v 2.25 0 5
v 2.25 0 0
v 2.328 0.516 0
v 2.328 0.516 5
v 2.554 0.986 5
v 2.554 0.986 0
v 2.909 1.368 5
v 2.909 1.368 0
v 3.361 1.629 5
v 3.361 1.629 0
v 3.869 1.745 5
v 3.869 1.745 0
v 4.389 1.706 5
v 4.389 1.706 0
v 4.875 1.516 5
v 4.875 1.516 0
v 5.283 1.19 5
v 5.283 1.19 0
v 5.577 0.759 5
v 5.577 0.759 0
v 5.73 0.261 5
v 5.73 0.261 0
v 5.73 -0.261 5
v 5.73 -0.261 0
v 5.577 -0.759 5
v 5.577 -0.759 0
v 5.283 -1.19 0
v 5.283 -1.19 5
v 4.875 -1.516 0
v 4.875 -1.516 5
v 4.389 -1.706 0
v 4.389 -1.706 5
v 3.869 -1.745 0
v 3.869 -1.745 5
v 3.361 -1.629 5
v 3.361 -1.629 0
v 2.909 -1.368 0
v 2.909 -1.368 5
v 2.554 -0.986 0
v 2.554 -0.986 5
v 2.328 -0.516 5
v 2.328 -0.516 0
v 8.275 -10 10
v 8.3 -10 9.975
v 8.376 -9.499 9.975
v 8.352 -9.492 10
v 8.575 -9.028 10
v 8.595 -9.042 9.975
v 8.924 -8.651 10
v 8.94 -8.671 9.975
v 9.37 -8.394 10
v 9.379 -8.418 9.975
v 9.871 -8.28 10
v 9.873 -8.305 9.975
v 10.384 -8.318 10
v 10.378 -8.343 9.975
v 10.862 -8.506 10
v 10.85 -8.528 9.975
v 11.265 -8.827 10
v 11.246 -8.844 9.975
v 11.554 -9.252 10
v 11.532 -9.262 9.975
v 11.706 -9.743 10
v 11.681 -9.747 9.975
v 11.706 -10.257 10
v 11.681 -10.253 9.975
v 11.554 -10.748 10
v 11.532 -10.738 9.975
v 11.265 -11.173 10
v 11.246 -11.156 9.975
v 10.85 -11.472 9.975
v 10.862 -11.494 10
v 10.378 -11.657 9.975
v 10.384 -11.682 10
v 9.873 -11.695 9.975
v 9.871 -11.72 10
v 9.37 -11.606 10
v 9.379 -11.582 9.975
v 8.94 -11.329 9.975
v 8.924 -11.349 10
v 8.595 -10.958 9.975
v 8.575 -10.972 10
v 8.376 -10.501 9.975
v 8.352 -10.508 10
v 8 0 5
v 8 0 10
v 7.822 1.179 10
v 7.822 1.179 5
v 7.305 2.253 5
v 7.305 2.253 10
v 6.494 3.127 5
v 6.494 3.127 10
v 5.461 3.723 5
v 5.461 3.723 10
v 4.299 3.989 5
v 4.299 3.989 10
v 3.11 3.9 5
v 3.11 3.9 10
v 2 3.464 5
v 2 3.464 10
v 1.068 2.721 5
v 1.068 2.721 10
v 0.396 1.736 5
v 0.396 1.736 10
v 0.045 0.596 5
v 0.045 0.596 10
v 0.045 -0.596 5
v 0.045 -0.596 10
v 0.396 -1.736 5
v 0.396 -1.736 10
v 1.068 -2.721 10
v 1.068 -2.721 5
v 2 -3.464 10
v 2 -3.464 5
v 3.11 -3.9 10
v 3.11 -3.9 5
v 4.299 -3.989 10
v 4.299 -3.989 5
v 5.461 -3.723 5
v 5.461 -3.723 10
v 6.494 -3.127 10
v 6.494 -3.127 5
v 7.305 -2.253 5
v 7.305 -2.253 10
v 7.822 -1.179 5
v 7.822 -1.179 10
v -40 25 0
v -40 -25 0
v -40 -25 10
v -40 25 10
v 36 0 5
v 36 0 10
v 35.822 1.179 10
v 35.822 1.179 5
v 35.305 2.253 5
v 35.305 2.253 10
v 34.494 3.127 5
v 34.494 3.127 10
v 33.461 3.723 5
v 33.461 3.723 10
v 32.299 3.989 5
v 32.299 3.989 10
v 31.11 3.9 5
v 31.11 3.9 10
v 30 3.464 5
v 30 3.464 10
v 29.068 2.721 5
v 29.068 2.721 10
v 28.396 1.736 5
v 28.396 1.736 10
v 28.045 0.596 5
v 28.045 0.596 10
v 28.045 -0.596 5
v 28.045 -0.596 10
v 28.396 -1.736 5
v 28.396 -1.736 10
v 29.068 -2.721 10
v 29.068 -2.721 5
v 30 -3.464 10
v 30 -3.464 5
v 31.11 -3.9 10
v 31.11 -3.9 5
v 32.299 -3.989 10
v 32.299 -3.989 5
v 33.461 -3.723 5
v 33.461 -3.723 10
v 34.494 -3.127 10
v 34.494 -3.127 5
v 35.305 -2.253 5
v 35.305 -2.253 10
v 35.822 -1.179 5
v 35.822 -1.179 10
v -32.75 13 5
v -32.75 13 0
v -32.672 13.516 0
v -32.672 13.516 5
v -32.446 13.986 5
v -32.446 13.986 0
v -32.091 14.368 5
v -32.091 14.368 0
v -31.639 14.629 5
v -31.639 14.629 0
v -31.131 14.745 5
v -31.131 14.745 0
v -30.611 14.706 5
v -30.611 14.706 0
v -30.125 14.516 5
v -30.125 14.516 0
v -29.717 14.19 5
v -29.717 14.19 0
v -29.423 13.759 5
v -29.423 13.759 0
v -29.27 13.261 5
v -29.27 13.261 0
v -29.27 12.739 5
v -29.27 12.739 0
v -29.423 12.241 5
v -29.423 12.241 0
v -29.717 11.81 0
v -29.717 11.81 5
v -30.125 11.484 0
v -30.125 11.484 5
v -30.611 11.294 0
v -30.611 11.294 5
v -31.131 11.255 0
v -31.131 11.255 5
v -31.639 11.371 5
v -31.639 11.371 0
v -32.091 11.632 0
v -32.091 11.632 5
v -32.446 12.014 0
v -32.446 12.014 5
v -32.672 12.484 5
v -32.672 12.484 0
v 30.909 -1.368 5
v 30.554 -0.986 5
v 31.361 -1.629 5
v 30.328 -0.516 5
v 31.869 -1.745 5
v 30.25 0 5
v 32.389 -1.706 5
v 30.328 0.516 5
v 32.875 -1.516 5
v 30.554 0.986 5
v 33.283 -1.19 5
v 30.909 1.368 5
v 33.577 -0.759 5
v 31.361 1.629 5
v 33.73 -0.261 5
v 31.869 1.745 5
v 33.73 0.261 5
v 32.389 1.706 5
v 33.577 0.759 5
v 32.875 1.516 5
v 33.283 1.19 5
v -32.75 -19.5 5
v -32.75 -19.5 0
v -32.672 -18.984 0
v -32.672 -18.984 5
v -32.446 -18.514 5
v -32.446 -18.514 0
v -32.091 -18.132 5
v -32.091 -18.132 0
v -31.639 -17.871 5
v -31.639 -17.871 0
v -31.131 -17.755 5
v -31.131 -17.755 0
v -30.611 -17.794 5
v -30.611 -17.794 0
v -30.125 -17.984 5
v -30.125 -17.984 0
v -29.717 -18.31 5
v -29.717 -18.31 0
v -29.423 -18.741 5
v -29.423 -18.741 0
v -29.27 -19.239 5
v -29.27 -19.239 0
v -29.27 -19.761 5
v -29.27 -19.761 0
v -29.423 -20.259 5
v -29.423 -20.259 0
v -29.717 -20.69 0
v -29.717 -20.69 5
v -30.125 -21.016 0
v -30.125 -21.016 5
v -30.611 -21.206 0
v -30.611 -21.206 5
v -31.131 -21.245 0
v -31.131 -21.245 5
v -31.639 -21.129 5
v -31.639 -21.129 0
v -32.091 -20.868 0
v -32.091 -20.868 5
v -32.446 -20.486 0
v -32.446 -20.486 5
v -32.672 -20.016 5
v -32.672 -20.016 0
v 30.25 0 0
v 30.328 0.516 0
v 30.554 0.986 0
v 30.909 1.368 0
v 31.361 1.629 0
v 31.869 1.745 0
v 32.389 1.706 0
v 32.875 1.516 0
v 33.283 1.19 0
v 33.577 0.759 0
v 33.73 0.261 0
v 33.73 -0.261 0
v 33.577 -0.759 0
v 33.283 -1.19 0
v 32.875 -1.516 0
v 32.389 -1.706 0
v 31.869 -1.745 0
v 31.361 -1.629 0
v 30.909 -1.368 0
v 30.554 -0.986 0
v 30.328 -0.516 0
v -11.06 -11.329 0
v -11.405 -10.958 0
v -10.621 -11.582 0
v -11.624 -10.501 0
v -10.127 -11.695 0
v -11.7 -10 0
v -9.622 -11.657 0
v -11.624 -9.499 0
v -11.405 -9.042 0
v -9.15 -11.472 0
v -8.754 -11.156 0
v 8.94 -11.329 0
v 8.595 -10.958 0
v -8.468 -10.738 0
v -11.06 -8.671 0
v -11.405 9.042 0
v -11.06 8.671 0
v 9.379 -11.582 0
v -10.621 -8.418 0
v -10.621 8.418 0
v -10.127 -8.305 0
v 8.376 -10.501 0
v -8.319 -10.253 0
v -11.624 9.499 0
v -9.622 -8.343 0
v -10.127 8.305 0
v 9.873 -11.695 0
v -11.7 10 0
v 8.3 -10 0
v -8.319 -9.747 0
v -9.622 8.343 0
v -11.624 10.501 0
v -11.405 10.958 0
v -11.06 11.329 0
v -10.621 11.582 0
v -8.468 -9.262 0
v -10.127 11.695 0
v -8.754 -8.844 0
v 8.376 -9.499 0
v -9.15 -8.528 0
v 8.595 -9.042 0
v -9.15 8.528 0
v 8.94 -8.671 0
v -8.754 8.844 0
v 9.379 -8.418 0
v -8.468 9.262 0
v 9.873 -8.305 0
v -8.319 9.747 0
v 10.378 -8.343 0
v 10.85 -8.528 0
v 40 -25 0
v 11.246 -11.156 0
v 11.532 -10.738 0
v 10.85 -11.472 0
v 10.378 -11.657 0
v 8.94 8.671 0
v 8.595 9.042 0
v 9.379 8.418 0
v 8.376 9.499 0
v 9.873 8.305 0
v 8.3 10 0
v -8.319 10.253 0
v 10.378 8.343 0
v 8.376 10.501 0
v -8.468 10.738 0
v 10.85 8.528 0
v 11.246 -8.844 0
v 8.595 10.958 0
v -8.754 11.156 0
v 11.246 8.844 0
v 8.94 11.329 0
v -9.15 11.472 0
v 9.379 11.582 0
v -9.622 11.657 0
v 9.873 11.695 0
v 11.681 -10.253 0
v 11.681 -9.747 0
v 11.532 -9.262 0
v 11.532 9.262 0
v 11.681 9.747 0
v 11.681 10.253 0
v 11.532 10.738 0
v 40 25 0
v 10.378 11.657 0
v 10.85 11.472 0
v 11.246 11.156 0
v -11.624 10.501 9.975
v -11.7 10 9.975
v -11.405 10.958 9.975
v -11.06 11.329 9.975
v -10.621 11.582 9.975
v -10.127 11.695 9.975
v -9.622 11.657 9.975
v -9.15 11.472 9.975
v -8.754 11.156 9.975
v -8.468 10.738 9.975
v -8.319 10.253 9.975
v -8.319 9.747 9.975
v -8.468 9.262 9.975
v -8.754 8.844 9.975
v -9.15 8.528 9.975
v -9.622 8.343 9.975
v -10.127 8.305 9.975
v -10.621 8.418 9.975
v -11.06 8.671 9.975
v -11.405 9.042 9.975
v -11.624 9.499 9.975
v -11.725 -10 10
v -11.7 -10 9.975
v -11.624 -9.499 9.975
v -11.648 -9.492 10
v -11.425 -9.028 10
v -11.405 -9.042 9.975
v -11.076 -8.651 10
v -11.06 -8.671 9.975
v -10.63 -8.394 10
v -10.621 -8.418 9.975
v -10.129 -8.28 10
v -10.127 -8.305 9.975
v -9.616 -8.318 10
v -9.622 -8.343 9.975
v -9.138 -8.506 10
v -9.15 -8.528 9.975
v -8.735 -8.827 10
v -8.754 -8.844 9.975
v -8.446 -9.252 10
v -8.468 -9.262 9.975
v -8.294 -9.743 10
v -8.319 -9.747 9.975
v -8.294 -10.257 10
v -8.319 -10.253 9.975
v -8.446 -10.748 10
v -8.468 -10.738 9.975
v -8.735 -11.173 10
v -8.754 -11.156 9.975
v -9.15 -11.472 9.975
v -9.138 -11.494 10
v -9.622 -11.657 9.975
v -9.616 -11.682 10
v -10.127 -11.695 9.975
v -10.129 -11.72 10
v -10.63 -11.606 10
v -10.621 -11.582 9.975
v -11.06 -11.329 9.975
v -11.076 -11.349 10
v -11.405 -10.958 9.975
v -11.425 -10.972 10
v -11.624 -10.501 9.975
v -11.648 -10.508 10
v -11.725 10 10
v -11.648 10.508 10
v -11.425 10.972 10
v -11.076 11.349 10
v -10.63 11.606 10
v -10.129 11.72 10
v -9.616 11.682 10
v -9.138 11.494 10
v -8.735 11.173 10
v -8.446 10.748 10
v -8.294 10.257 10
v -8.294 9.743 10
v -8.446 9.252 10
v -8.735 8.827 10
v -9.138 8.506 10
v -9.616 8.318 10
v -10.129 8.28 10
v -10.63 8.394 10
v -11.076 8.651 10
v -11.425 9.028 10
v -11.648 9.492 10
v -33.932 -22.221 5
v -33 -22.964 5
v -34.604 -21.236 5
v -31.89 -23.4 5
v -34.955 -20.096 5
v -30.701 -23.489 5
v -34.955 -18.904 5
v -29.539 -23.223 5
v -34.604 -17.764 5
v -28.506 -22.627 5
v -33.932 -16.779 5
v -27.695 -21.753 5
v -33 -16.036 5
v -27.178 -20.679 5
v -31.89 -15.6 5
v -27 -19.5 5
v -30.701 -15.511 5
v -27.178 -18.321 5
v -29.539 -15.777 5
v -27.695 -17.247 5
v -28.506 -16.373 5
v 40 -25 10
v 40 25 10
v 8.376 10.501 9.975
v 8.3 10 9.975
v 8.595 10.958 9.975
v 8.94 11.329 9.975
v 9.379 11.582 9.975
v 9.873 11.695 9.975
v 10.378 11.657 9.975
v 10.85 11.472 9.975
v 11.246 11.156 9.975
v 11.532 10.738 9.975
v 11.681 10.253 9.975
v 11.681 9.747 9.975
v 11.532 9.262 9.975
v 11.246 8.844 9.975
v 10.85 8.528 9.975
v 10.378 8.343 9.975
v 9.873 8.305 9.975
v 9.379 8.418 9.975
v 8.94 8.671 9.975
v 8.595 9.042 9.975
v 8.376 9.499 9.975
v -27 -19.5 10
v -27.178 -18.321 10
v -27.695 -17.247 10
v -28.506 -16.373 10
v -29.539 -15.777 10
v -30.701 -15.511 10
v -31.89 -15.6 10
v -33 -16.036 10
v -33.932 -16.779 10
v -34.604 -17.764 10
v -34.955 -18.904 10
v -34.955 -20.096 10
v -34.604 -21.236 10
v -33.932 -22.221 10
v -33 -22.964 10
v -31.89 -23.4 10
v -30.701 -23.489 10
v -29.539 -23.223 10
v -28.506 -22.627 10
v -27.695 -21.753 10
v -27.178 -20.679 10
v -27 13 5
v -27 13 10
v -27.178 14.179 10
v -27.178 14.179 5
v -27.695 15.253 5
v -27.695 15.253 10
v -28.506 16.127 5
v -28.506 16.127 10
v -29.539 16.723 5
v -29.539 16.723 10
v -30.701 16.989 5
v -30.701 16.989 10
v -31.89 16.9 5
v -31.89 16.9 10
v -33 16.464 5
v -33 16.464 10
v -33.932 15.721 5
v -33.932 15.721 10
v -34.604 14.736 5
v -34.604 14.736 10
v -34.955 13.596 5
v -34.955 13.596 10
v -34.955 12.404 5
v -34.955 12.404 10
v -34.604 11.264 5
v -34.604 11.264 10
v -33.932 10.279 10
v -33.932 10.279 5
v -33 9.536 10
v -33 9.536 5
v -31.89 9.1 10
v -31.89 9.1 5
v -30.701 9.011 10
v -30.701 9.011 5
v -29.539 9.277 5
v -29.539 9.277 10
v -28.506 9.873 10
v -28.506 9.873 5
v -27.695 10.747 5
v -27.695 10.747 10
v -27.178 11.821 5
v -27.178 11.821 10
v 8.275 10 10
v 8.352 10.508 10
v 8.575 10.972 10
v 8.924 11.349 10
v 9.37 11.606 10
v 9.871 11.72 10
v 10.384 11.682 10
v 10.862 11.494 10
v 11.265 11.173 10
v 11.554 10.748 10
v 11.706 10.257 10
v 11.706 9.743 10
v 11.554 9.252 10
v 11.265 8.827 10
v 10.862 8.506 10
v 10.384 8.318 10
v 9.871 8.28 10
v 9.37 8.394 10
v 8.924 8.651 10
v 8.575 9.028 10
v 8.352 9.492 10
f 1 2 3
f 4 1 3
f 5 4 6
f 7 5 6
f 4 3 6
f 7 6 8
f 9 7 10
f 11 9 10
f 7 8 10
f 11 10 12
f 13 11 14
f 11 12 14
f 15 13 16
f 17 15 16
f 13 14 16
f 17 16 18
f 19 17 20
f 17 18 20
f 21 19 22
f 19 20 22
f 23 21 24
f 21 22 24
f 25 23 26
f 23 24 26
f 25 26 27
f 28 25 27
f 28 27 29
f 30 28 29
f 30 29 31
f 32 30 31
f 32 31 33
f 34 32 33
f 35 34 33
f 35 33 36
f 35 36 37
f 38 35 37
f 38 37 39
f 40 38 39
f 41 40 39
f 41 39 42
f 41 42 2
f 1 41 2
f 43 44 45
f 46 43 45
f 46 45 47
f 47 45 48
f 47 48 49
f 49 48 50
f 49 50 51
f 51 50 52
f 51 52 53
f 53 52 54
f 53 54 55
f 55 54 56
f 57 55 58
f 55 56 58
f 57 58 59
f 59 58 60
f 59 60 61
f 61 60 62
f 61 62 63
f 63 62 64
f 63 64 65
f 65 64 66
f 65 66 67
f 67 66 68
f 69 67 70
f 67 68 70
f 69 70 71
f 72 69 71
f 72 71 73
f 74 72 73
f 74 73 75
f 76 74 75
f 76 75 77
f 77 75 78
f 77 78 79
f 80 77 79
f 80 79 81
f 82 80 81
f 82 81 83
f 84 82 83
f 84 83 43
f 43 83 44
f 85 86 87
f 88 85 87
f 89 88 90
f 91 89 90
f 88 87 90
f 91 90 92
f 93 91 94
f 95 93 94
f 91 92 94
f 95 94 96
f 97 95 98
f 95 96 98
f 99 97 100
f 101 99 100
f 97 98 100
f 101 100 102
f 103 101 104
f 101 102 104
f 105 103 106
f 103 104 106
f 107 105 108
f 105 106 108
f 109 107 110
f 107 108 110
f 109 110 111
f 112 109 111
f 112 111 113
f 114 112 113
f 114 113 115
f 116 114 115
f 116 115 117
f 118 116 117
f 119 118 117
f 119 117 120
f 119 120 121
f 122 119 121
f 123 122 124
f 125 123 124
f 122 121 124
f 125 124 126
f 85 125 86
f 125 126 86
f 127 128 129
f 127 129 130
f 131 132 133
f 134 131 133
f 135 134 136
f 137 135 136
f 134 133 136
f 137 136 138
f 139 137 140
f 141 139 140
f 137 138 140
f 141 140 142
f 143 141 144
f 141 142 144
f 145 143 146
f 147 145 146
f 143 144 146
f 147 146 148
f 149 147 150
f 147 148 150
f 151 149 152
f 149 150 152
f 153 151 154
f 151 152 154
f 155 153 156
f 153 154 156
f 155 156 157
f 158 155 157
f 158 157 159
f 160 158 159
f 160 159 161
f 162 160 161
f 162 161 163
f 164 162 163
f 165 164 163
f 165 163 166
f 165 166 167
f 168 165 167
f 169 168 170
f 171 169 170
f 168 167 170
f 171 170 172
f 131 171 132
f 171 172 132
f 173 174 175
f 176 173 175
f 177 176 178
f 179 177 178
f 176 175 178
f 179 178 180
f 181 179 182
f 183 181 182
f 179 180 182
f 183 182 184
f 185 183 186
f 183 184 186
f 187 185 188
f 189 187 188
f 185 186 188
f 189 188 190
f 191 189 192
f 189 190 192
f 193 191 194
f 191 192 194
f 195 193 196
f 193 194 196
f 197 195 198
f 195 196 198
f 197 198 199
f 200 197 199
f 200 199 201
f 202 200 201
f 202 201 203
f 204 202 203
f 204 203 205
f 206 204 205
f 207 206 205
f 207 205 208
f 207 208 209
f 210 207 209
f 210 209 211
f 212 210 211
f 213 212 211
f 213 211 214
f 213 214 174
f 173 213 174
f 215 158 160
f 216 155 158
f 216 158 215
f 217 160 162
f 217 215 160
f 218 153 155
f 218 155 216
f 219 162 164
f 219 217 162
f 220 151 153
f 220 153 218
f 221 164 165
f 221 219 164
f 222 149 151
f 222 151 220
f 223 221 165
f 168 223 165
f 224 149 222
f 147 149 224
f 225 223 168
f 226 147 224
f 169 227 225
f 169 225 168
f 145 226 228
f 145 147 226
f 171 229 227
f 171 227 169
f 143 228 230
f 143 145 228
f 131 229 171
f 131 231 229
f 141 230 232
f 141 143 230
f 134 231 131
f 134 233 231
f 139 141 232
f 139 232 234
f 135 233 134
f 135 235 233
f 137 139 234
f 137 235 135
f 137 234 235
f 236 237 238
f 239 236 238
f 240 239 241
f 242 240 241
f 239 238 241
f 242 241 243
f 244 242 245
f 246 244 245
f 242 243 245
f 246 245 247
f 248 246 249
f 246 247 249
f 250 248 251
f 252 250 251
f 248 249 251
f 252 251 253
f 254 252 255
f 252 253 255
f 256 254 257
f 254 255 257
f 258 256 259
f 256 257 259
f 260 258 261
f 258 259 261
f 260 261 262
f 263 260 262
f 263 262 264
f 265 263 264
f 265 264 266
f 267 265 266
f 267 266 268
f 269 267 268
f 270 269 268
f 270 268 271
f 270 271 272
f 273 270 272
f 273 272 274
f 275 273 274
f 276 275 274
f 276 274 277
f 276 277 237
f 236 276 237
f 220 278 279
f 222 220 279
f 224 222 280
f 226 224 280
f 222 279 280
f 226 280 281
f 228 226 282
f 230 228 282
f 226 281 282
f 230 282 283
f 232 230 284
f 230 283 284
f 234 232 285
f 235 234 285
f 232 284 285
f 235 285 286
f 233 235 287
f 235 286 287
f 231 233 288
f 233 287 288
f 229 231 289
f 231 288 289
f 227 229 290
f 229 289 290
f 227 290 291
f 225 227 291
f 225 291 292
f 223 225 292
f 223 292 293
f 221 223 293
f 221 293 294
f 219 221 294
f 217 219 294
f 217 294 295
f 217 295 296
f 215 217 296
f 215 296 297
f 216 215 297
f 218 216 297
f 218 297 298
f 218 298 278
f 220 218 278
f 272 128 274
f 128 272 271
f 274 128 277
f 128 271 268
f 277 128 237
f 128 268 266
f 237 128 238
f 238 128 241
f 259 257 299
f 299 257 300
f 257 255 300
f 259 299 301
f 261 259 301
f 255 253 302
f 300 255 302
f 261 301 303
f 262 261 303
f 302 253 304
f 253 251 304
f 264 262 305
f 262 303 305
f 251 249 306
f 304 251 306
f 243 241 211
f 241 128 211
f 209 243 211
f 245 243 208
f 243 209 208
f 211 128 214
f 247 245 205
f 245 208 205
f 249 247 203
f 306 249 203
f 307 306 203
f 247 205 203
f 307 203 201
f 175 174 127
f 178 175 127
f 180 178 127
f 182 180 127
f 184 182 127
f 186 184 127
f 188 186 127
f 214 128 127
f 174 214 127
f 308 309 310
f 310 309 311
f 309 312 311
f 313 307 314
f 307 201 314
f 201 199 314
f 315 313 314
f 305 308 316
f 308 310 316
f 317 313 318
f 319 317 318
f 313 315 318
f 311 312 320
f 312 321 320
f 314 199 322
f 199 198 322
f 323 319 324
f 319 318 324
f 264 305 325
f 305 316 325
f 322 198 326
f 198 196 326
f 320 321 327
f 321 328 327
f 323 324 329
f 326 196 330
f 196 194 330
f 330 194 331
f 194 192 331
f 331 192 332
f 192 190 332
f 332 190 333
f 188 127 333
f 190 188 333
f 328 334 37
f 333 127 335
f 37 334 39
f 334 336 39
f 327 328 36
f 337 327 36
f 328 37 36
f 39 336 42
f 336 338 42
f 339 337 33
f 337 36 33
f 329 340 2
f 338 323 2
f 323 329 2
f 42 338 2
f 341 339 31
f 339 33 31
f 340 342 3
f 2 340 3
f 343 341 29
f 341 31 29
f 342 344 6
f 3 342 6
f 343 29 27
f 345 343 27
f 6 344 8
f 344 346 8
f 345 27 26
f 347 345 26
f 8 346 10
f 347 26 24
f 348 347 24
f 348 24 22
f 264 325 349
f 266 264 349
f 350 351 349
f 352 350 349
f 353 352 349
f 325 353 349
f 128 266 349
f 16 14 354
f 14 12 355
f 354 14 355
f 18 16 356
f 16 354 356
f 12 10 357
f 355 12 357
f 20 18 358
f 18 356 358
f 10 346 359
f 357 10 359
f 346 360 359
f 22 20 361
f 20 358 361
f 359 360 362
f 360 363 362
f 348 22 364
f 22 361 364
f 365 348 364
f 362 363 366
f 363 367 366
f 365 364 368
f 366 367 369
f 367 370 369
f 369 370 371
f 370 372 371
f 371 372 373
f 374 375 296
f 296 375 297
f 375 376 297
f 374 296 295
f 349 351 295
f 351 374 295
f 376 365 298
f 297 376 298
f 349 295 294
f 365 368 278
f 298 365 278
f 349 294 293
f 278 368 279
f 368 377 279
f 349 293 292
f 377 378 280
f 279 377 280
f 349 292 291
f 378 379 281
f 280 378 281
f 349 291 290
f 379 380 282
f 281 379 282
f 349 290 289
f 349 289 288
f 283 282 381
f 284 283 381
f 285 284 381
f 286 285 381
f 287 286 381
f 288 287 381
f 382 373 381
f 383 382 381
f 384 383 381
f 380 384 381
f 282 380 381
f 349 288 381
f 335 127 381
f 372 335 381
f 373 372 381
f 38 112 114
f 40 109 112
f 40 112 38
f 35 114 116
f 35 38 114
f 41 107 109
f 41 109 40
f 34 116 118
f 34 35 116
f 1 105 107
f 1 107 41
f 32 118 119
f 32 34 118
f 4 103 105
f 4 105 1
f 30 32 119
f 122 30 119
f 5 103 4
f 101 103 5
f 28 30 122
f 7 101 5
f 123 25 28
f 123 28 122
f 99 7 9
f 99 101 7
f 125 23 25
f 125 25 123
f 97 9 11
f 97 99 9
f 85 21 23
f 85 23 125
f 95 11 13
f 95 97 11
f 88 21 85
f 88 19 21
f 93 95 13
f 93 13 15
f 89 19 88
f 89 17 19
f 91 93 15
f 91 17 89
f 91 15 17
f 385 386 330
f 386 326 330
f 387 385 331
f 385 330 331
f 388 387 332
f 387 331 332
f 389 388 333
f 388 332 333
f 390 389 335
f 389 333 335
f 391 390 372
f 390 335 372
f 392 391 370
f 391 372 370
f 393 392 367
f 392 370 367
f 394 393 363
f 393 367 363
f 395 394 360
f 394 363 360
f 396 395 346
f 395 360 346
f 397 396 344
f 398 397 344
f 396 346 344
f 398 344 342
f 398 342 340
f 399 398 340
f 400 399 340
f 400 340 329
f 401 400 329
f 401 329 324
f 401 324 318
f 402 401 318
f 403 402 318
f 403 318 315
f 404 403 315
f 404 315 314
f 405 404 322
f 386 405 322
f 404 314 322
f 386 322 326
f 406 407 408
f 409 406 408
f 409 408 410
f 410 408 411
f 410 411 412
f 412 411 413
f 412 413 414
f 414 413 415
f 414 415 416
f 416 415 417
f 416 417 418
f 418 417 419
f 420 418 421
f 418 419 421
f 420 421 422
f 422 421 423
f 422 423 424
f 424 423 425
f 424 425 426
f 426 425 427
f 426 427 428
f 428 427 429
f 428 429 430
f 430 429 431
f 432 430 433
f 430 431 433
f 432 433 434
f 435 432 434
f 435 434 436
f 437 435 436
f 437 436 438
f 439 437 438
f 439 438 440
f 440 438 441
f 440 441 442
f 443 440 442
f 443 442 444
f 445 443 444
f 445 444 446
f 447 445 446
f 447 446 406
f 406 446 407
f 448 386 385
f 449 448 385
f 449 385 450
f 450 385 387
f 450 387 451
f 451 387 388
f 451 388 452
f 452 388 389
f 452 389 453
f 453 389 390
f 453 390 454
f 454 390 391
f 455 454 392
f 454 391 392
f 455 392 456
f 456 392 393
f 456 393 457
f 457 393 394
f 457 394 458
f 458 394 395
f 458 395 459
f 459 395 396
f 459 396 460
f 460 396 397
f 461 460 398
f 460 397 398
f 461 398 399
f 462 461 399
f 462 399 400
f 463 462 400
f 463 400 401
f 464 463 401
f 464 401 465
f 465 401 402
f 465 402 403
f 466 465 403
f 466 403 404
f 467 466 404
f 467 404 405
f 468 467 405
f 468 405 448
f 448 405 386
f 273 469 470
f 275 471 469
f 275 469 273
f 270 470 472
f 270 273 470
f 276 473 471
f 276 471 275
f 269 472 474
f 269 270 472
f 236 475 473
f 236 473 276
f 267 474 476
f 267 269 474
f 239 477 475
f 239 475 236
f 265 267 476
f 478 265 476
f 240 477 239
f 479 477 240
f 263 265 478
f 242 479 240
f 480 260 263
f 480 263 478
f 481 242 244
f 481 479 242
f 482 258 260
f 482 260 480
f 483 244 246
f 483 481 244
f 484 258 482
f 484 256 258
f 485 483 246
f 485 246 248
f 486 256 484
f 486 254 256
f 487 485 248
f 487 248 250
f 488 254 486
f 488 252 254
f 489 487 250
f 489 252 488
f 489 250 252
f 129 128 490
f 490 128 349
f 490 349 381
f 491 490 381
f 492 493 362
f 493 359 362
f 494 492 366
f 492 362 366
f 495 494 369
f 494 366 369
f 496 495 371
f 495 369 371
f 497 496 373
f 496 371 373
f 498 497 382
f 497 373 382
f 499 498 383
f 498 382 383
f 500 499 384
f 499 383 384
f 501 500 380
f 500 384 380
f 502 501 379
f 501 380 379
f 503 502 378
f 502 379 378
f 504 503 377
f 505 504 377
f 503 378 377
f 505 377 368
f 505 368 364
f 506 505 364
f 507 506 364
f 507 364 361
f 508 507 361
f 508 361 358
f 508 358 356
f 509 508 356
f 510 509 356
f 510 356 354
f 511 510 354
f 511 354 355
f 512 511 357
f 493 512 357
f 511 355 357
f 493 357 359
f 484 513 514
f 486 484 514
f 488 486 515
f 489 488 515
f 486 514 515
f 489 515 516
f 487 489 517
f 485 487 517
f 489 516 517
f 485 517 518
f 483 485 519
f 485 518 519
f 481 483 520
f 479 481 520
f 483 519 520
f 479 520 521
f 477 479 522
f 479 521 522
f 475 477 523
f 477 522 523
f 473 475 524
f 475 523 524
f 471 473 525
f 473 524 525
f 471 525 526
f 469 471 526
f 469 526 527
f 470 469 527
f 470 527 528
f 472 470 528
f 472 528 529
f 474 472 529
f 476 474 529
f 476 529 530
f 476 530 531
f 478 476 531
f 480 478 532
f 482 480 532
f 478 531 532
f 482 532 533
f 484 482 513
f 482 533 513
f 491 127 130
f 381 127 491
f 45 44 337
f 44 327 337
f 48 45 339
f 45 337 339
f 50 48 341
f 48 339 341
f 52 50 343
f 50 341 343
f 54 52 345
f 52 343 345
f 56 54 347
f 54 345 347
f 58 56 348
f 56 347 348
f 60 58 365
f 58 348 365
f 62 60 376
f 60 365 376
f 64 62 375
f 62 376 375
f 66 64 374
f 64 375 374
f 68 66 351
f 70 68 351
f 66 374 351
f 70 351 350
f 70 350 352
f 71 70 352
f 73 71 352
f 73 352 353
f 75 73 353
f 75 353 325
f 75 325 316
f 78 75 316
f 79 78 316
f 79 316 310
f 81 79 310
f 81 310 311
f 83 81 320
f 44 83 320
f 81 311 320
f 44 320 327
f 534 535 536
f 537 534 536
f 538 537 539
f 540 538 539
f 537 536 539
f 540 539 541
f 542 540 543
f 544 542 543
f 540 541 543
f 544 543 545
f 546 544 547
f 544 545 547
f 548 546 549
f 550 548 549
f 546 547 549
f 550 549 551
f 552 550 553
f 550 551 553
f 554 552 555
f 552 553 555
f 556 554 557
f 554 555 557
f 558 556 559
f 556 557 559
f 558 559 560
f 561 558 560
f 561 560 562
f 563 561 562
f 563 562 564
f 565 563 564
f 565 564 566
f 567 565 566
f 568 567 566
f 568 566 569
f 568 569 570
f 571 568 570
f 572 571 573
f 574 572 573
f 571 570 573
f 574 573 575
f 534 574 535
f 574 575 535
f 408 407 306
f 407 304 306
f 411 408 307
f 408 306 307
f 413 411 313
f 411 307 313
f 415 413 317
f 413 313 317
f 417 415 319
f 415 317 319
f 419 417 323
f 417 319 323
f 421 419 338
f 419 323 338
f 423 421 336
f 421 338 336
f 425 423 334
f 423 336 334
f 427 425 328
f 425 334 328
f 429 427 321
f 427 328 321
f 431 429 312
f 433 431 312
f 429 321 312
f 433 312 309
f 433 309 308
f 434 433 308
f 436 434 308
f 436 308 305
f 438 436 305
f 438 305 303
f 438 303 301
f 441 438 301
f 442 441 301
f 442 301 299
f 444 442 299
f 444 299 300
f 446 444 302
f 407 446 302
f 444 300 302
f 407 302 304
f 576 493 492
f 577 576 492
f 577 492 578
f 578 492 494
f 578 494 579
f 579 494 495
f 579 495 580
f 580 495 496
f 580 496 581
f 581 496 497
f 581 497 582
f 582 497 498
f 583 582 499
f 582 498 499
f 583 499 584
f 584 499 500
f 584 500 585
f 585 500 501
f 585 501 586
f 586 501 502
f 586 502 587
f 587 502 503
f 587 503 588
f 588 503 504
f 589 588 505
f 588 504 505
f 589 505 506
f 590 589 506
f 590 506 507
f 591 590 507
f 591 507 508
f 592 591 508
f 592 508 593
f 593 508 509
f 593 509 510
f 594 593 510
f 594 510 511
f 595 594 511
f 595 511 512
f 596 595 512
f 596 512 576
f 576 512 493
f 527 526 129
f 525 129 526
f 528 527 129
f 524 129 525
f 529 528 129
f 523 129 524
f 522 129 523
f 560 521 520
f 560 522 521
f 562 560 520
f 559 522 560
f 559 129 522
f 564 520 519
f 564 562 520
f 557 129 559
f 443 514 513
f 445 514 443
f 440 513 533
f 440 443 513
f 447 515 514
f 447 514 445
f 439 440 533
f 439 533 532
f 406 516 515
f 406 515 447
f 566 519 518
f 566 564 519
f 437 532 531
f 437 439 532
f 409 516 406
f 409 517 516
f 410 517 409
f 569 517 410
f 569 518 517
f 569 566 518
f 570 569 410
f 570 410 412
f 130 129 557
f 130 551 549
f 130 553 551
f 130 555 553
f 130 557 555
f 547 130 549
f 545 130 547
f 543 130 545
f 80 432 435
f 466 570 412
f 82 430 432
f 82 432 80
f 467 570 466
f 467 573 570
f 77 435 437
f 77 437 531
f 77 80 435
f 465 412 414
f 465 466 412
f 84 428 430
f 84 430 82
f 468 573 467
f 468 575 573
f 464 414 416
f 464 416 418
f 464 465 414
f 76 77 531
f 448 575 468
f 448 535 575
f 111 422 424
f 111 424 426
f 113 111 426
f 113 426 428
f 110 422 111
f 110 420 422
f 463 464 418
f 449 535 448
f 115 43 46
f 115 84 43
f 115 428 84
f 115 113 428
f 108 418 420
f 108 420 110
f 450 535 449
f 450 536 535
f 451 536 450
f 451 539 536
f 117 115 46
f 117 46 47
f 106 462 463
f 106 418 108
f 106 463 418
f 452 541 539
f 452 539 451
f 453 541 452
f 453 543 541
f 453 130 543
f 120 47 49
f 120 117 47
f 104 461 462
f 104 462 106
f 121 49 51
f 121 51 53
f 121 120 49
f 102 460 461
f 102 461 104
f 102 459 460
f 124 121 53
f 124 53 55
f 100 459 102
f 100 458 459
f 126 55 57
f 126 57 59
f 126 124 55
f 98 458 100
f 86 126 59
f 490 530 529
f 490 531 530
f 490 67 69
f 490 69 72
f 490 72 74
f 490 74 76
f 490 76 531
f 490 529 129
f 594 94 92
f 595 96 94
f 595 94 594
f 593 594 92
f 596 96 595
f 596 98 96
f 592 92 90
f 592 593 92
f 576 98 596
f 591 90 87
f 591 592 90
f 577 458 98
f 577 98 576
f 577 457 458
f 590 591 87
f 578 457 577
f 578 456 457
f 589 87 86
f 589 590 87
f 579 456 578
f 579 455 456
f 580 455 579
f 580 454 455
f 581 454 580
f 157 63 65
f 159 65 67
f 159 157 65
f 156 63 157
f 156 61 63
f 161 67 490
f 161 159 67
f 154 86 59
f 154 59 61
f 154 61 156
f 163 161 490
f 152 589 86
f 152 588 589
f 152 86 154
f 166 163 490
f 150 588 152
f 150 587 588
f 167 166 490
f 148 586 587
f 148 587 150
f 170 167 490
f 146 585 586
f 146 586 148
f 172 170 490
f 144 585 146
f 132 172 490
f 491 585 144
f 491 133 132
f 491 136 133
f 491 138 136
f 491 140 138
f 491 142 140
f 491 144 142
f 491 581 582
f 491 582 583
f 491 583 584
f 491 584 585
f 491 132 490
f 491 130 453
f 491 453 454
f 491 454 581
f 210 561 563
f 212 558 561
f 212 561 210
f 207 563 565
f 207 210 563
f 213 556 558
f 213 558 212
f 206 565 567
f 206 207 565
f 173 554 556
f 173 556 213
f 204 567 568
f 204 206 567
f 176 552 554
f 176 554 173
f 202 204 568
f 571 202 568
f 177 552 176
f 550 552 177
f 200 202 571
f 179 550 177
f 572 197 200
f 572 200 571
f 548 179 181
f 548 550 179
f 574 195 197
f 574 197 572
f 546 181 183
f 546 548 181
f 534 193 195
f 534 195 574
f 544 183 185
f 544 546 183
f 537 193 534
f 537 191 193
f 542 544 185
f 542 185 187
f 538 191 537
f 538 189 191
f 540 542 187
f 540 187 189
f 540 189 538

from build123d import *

# Parameters (mm, degrees)
SKETCH_1_W                   = 80
SKETCH_1_H                   = 50
EXTRUDE_1_DEPTH              = 10
SKETCH_5_R                   = 1.75
CUT_EXTRUDE_1_DEPTH          = 49.218253805
SKETCH_6_R                   = 4
CUT_EXTRUDE_2_DEPTH          = 5
HOLE_WIZARD_M3_1_D           = 3.4
HOLE_WIZARD_M3_1_CSINK_D     = 3.45
HOLE_WIZARD_M3_1_CSINK_ANGLE = 90


with BuildPart() as part:
    # 草图1 → 凸台-拉伸1 (new body)
    with BuildSketch(Plane.XY):
        Rectangle(SKETCH_1_W, SKETCH_1_H)
    extrude(amount=EXTRUDE_1_DEPTH)

    # 草图5 → 切除-拉伸1 (cut, through all)
    with BuildSketch(Plane(origin=(0, 0, 0), x_dir=(-1, 0, 0), z_dir=(0, 0, -1))):
        with Locations((-32, 0)):
            Circle(SKETCH_5_R)
        with Locations((-4, 0)):
            Circle(SKETCH_5_R)
        with Locations((31, 13)):
            Circle(SKETCH_5_R)
        with Locations((31, -19.5)):
            Circle(SKETCH_5_R)
    extrude(amount=-CUT_EXTRUDE_1_DEPTH, mode=Mode.SUBTRACT)

    # 草图6 → 切除-拉伸2 (cut)
    with BuildSketch(Plane.XY.offset(10)):
        with Locations((-31, 13)):
            Circle(SKETCH_6_R)
        with Locations((4, 0)):
            Circle(SKETCH_6_R)
        with Locations((32, 0)):
            Circle(SKETCH_6_R)
        with Locations((-31, -19.5)):
            Circle(SKETCH_6_R)
    extrude(amount=-CUT_EXTRUDE_2_DEPTH, mode=Mode.SUBTRACT)

    # M3 间隙孔1 (through all)
    with Locations(Plane.XY.offset(10)):
        with Locations((-10, 10), (10, 10), (10, -10), (-10, -10)):
            CounterSinkHole(HOLE_WIZARD_M3_1_D / 2, HOLE_WIZARD_M3_1_CSINK_D / 2, counter_sink_angle=HOLE_WIZARD_M3_1_CSINK_ANGLE)


solid = part.part
